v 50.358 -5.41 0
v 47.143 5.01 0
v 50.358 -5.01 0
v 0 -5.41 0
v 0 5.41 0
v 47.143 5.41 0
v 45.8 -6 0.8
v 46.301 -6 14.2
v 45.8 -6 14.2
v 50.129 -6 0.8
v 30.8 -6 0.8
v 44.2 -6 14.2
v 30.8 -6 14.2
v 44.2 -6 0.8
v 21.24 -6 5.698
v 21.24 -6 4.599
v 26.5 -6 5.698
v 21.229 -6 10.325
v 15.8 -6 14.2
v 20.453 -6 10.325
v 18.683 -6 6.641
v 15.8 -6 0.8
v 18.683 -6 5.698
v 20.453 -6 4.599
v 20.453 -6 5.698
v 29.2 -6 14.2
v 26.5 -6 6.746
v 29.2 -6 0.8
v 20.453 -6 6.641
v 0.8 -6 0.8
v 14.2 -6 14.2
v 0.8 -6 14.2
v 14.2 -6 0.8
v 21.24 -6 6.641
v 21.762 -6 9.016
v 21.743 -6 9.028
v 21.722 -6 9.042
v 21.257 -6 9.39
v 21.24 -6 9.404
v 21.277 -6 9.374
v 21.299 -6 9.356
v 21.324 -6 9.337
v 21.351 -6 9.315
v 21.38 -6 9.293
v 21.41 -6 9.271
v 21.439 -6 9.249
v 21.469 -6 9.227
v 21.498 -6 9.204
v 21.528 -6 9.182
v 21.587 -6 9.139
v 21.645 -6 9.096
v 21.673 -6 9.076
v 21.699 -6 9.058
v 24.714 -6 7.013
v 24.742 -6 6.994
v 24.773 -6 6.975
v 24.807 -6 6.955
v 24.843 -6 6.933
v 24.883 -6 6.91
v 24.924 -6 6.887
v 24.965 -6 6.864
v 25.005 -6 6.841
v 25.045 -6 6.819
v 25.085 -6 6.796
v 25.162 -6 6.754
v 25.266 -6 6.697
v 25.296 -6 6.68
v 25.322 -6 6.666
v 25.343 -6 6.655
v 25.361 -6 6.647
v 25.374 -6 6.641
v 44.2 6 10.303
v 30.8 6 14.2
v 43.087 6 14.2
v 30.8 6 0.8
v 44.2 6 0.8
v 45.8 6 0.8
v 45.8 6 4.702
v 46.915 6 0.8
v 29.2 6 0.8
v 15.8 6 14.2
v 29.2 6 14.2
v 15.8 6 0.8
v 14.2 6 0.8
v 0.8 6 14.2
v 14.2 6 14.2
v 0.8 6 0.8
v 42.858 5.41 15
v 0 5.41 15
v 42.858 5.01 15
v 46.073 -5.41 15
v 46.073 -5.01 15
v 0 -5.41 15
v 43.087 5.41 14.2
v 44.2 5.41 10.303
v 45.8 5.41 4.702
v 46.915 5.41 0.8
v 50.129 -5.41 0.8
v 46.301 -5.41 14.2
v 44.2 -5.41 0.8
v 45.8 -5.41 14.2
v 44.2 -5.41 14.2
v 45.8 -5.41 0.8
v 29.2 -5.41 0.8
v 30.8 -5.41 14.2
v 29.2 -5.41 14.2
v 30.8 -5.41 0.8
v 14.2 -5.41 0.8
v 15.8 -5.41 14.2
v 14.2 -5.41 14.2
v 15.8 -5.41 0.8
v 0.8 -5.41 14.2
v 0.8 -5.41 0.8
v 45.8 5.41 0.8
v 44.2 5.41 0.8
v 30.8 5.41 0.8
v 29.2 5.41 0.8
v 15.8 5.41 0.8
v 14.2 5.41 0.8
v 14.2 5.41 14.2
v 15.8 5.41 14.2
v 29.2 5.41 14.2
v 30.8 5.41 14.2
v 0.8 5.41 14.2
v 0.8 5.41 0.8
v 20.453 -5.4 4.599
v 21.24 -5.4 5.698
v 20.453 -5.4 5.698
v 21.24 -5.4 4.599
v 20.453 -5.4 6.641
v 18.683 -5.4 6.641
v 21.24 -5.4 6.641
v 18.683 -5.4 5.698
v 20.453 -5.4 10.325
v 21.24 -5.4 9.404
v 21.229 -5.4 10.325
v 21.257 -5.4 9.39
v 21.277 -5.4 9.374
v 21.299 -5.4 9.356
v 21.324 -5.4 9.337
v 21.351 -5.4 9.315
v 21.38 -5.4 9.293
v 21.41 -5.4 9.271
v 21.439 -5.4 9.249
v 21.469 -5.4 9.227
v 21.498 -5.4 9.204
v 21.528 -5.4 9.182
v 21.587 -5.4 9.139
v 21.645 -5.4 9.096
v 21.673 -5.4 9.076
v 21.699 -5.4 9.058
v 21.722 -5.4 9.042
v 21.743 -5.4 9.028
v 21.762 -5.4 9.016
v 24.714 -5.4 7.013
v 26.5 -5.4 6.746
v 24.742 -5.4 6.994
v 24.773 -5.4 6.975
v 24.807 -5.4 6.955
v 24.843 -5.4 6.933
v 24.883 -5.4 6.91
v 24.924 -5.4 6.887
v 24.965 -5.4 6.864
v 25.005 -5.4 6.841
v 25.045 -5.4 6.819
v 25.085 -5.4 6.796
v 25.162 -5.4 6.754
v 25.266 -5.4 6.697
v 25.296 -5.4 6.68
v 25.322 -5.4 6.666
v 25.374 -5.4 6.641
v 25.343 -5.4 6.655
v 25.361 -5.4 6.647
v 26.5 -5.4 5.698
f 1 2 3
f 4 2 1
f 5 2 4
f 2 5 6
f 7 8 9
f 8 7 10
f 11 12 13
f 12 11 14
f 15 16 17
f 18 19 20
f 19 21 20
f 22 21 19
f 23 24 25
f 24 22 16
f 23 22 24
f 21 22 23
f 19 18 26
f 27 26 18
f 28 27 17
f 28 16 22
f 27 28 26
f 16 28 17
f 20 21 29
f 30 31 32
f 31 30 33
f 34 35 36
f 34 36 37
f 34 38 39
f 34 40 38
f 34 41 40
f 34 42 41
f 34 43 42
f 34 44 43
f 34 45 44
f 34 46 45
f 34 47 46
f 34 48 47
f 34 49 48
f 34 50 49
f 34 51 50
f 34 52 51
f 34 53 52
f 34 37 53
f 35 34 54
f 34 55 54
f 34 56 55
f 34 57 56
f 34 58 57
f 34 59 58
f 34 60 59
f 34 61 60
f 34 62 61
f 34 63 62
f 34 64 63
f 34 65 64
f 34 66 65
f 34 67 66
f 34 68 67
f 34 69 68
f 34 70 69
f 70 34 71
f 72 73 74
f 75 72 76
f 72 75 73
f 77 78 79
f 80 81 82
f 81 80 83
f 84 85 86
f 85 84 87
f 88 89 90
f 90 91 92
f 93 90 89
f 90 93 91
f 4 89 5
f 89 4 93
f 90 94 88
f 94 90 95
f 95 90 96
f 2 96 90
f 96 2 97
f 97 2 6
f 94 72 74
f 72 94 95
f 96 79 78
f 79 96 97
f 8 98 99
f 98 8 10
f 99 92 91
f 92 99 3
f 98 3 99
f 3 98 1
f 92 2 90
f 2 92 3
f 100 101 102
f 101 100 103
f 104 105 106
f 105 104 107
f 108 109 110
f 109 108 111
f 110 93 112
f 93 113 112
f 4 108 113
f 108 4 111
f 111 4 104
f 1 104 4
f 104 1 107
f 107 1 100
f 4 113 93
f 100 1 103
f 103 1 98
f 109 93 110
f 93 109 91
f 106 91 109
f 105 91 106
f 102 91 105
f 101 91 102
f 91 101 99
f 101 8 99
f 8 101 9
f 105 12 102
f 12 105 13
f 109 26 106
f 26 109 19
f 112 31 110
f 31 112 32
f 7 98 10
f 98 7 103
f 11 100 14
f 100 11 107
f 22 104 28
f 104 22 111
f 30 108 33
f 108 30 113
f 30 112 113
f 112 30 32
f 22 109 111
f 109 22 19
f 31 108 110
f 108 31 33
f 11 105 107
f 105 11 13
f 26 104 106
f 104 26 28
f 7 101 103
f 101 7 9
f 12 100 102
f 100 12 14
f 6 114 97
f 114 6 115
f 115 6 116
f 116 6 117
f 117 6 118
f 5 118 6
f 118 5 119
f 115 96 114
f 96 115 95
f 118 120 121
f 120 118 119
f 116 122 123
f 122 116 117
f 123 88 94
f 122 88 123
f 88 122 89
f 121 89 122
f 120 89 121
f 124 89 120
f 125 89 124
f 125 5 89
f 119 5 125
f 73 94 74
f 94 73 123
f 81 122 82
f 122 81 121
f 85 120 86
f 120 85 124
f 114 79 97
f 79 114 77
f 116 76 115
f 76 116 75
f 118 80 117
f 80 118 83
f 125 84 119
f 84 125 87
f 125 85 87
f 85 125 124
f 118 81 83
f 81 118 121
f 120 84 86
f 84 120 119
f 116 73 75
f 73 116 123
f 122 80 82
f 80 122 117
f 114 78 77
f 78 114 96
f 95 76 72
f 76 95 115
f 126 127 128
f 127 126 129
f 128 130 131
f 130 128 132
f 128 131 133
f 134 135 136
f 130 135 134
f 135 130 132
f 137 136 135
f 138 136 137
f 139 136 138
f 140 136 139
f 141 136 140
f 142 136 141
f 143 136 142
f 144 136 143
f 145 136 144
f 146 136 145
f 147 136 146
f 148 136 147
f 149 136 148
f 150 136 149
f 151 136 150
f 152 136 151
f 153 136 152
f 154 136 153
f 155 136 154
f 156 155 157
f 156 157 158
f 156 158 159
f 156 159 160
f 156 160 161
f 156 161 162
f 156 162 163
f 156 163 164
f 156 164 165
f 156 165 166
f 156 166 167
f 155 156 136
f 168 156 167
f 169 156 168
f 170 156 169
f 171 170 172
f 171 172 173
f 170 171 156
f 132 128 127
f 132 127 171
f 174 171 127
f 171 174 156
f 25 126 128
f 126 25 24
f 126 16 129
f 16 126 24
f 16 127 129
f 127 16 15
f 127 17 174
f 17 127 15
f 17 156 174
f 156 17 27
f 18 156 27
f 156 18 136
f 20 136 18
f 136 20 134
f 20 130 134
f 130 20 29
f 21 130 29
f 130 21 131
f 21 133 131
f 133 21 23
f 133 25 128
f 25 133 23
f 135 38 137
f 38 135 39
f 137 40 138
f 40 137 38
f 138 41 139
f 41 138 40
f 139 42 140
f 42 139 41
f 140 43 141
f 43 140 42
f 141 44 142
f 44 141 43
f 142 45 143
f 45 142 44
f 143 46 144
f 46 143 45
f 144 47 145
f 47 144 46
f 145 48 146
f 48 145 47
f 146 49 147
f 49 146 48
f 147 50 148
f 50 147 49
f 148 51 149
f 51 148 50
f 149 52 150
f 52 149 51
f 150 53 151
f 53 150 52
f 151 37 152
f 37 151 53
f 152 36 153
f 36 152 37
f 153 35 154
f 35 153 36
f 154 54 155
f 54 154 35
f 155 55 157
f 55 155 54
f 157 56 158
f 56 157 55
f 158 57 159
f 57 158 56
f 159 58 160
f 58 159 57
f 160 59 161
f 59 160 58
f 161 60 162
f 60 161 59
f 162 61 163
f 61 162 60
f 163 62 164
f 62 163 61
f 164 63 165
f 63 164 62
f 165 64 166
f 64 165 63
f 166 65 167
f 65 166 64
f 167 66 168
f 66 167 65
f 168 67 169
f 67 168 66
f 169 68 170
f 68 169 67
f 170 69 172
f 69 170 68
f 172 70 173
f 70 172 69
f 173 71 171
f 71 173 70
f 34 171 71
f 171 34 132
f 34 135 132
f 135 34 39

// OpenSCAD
/*

  puzzle_part_4.scad

  Winston Freer Tile Puzzle: Part 4
      
  (c) olikraus@gmail.com

  This work is licensed under the Creative Commons Attribution-NonCommercial-ShareAlike 4.0 International License. 
  To view a copy of this license, visit http://creativecommons.org/licenses/by-nc-sa/4.0/.
    
*/

include <winston_freer.scad>;


rotate([0,90,-90]) 
translate([-3*ts,-ts,0]) 
part4();
